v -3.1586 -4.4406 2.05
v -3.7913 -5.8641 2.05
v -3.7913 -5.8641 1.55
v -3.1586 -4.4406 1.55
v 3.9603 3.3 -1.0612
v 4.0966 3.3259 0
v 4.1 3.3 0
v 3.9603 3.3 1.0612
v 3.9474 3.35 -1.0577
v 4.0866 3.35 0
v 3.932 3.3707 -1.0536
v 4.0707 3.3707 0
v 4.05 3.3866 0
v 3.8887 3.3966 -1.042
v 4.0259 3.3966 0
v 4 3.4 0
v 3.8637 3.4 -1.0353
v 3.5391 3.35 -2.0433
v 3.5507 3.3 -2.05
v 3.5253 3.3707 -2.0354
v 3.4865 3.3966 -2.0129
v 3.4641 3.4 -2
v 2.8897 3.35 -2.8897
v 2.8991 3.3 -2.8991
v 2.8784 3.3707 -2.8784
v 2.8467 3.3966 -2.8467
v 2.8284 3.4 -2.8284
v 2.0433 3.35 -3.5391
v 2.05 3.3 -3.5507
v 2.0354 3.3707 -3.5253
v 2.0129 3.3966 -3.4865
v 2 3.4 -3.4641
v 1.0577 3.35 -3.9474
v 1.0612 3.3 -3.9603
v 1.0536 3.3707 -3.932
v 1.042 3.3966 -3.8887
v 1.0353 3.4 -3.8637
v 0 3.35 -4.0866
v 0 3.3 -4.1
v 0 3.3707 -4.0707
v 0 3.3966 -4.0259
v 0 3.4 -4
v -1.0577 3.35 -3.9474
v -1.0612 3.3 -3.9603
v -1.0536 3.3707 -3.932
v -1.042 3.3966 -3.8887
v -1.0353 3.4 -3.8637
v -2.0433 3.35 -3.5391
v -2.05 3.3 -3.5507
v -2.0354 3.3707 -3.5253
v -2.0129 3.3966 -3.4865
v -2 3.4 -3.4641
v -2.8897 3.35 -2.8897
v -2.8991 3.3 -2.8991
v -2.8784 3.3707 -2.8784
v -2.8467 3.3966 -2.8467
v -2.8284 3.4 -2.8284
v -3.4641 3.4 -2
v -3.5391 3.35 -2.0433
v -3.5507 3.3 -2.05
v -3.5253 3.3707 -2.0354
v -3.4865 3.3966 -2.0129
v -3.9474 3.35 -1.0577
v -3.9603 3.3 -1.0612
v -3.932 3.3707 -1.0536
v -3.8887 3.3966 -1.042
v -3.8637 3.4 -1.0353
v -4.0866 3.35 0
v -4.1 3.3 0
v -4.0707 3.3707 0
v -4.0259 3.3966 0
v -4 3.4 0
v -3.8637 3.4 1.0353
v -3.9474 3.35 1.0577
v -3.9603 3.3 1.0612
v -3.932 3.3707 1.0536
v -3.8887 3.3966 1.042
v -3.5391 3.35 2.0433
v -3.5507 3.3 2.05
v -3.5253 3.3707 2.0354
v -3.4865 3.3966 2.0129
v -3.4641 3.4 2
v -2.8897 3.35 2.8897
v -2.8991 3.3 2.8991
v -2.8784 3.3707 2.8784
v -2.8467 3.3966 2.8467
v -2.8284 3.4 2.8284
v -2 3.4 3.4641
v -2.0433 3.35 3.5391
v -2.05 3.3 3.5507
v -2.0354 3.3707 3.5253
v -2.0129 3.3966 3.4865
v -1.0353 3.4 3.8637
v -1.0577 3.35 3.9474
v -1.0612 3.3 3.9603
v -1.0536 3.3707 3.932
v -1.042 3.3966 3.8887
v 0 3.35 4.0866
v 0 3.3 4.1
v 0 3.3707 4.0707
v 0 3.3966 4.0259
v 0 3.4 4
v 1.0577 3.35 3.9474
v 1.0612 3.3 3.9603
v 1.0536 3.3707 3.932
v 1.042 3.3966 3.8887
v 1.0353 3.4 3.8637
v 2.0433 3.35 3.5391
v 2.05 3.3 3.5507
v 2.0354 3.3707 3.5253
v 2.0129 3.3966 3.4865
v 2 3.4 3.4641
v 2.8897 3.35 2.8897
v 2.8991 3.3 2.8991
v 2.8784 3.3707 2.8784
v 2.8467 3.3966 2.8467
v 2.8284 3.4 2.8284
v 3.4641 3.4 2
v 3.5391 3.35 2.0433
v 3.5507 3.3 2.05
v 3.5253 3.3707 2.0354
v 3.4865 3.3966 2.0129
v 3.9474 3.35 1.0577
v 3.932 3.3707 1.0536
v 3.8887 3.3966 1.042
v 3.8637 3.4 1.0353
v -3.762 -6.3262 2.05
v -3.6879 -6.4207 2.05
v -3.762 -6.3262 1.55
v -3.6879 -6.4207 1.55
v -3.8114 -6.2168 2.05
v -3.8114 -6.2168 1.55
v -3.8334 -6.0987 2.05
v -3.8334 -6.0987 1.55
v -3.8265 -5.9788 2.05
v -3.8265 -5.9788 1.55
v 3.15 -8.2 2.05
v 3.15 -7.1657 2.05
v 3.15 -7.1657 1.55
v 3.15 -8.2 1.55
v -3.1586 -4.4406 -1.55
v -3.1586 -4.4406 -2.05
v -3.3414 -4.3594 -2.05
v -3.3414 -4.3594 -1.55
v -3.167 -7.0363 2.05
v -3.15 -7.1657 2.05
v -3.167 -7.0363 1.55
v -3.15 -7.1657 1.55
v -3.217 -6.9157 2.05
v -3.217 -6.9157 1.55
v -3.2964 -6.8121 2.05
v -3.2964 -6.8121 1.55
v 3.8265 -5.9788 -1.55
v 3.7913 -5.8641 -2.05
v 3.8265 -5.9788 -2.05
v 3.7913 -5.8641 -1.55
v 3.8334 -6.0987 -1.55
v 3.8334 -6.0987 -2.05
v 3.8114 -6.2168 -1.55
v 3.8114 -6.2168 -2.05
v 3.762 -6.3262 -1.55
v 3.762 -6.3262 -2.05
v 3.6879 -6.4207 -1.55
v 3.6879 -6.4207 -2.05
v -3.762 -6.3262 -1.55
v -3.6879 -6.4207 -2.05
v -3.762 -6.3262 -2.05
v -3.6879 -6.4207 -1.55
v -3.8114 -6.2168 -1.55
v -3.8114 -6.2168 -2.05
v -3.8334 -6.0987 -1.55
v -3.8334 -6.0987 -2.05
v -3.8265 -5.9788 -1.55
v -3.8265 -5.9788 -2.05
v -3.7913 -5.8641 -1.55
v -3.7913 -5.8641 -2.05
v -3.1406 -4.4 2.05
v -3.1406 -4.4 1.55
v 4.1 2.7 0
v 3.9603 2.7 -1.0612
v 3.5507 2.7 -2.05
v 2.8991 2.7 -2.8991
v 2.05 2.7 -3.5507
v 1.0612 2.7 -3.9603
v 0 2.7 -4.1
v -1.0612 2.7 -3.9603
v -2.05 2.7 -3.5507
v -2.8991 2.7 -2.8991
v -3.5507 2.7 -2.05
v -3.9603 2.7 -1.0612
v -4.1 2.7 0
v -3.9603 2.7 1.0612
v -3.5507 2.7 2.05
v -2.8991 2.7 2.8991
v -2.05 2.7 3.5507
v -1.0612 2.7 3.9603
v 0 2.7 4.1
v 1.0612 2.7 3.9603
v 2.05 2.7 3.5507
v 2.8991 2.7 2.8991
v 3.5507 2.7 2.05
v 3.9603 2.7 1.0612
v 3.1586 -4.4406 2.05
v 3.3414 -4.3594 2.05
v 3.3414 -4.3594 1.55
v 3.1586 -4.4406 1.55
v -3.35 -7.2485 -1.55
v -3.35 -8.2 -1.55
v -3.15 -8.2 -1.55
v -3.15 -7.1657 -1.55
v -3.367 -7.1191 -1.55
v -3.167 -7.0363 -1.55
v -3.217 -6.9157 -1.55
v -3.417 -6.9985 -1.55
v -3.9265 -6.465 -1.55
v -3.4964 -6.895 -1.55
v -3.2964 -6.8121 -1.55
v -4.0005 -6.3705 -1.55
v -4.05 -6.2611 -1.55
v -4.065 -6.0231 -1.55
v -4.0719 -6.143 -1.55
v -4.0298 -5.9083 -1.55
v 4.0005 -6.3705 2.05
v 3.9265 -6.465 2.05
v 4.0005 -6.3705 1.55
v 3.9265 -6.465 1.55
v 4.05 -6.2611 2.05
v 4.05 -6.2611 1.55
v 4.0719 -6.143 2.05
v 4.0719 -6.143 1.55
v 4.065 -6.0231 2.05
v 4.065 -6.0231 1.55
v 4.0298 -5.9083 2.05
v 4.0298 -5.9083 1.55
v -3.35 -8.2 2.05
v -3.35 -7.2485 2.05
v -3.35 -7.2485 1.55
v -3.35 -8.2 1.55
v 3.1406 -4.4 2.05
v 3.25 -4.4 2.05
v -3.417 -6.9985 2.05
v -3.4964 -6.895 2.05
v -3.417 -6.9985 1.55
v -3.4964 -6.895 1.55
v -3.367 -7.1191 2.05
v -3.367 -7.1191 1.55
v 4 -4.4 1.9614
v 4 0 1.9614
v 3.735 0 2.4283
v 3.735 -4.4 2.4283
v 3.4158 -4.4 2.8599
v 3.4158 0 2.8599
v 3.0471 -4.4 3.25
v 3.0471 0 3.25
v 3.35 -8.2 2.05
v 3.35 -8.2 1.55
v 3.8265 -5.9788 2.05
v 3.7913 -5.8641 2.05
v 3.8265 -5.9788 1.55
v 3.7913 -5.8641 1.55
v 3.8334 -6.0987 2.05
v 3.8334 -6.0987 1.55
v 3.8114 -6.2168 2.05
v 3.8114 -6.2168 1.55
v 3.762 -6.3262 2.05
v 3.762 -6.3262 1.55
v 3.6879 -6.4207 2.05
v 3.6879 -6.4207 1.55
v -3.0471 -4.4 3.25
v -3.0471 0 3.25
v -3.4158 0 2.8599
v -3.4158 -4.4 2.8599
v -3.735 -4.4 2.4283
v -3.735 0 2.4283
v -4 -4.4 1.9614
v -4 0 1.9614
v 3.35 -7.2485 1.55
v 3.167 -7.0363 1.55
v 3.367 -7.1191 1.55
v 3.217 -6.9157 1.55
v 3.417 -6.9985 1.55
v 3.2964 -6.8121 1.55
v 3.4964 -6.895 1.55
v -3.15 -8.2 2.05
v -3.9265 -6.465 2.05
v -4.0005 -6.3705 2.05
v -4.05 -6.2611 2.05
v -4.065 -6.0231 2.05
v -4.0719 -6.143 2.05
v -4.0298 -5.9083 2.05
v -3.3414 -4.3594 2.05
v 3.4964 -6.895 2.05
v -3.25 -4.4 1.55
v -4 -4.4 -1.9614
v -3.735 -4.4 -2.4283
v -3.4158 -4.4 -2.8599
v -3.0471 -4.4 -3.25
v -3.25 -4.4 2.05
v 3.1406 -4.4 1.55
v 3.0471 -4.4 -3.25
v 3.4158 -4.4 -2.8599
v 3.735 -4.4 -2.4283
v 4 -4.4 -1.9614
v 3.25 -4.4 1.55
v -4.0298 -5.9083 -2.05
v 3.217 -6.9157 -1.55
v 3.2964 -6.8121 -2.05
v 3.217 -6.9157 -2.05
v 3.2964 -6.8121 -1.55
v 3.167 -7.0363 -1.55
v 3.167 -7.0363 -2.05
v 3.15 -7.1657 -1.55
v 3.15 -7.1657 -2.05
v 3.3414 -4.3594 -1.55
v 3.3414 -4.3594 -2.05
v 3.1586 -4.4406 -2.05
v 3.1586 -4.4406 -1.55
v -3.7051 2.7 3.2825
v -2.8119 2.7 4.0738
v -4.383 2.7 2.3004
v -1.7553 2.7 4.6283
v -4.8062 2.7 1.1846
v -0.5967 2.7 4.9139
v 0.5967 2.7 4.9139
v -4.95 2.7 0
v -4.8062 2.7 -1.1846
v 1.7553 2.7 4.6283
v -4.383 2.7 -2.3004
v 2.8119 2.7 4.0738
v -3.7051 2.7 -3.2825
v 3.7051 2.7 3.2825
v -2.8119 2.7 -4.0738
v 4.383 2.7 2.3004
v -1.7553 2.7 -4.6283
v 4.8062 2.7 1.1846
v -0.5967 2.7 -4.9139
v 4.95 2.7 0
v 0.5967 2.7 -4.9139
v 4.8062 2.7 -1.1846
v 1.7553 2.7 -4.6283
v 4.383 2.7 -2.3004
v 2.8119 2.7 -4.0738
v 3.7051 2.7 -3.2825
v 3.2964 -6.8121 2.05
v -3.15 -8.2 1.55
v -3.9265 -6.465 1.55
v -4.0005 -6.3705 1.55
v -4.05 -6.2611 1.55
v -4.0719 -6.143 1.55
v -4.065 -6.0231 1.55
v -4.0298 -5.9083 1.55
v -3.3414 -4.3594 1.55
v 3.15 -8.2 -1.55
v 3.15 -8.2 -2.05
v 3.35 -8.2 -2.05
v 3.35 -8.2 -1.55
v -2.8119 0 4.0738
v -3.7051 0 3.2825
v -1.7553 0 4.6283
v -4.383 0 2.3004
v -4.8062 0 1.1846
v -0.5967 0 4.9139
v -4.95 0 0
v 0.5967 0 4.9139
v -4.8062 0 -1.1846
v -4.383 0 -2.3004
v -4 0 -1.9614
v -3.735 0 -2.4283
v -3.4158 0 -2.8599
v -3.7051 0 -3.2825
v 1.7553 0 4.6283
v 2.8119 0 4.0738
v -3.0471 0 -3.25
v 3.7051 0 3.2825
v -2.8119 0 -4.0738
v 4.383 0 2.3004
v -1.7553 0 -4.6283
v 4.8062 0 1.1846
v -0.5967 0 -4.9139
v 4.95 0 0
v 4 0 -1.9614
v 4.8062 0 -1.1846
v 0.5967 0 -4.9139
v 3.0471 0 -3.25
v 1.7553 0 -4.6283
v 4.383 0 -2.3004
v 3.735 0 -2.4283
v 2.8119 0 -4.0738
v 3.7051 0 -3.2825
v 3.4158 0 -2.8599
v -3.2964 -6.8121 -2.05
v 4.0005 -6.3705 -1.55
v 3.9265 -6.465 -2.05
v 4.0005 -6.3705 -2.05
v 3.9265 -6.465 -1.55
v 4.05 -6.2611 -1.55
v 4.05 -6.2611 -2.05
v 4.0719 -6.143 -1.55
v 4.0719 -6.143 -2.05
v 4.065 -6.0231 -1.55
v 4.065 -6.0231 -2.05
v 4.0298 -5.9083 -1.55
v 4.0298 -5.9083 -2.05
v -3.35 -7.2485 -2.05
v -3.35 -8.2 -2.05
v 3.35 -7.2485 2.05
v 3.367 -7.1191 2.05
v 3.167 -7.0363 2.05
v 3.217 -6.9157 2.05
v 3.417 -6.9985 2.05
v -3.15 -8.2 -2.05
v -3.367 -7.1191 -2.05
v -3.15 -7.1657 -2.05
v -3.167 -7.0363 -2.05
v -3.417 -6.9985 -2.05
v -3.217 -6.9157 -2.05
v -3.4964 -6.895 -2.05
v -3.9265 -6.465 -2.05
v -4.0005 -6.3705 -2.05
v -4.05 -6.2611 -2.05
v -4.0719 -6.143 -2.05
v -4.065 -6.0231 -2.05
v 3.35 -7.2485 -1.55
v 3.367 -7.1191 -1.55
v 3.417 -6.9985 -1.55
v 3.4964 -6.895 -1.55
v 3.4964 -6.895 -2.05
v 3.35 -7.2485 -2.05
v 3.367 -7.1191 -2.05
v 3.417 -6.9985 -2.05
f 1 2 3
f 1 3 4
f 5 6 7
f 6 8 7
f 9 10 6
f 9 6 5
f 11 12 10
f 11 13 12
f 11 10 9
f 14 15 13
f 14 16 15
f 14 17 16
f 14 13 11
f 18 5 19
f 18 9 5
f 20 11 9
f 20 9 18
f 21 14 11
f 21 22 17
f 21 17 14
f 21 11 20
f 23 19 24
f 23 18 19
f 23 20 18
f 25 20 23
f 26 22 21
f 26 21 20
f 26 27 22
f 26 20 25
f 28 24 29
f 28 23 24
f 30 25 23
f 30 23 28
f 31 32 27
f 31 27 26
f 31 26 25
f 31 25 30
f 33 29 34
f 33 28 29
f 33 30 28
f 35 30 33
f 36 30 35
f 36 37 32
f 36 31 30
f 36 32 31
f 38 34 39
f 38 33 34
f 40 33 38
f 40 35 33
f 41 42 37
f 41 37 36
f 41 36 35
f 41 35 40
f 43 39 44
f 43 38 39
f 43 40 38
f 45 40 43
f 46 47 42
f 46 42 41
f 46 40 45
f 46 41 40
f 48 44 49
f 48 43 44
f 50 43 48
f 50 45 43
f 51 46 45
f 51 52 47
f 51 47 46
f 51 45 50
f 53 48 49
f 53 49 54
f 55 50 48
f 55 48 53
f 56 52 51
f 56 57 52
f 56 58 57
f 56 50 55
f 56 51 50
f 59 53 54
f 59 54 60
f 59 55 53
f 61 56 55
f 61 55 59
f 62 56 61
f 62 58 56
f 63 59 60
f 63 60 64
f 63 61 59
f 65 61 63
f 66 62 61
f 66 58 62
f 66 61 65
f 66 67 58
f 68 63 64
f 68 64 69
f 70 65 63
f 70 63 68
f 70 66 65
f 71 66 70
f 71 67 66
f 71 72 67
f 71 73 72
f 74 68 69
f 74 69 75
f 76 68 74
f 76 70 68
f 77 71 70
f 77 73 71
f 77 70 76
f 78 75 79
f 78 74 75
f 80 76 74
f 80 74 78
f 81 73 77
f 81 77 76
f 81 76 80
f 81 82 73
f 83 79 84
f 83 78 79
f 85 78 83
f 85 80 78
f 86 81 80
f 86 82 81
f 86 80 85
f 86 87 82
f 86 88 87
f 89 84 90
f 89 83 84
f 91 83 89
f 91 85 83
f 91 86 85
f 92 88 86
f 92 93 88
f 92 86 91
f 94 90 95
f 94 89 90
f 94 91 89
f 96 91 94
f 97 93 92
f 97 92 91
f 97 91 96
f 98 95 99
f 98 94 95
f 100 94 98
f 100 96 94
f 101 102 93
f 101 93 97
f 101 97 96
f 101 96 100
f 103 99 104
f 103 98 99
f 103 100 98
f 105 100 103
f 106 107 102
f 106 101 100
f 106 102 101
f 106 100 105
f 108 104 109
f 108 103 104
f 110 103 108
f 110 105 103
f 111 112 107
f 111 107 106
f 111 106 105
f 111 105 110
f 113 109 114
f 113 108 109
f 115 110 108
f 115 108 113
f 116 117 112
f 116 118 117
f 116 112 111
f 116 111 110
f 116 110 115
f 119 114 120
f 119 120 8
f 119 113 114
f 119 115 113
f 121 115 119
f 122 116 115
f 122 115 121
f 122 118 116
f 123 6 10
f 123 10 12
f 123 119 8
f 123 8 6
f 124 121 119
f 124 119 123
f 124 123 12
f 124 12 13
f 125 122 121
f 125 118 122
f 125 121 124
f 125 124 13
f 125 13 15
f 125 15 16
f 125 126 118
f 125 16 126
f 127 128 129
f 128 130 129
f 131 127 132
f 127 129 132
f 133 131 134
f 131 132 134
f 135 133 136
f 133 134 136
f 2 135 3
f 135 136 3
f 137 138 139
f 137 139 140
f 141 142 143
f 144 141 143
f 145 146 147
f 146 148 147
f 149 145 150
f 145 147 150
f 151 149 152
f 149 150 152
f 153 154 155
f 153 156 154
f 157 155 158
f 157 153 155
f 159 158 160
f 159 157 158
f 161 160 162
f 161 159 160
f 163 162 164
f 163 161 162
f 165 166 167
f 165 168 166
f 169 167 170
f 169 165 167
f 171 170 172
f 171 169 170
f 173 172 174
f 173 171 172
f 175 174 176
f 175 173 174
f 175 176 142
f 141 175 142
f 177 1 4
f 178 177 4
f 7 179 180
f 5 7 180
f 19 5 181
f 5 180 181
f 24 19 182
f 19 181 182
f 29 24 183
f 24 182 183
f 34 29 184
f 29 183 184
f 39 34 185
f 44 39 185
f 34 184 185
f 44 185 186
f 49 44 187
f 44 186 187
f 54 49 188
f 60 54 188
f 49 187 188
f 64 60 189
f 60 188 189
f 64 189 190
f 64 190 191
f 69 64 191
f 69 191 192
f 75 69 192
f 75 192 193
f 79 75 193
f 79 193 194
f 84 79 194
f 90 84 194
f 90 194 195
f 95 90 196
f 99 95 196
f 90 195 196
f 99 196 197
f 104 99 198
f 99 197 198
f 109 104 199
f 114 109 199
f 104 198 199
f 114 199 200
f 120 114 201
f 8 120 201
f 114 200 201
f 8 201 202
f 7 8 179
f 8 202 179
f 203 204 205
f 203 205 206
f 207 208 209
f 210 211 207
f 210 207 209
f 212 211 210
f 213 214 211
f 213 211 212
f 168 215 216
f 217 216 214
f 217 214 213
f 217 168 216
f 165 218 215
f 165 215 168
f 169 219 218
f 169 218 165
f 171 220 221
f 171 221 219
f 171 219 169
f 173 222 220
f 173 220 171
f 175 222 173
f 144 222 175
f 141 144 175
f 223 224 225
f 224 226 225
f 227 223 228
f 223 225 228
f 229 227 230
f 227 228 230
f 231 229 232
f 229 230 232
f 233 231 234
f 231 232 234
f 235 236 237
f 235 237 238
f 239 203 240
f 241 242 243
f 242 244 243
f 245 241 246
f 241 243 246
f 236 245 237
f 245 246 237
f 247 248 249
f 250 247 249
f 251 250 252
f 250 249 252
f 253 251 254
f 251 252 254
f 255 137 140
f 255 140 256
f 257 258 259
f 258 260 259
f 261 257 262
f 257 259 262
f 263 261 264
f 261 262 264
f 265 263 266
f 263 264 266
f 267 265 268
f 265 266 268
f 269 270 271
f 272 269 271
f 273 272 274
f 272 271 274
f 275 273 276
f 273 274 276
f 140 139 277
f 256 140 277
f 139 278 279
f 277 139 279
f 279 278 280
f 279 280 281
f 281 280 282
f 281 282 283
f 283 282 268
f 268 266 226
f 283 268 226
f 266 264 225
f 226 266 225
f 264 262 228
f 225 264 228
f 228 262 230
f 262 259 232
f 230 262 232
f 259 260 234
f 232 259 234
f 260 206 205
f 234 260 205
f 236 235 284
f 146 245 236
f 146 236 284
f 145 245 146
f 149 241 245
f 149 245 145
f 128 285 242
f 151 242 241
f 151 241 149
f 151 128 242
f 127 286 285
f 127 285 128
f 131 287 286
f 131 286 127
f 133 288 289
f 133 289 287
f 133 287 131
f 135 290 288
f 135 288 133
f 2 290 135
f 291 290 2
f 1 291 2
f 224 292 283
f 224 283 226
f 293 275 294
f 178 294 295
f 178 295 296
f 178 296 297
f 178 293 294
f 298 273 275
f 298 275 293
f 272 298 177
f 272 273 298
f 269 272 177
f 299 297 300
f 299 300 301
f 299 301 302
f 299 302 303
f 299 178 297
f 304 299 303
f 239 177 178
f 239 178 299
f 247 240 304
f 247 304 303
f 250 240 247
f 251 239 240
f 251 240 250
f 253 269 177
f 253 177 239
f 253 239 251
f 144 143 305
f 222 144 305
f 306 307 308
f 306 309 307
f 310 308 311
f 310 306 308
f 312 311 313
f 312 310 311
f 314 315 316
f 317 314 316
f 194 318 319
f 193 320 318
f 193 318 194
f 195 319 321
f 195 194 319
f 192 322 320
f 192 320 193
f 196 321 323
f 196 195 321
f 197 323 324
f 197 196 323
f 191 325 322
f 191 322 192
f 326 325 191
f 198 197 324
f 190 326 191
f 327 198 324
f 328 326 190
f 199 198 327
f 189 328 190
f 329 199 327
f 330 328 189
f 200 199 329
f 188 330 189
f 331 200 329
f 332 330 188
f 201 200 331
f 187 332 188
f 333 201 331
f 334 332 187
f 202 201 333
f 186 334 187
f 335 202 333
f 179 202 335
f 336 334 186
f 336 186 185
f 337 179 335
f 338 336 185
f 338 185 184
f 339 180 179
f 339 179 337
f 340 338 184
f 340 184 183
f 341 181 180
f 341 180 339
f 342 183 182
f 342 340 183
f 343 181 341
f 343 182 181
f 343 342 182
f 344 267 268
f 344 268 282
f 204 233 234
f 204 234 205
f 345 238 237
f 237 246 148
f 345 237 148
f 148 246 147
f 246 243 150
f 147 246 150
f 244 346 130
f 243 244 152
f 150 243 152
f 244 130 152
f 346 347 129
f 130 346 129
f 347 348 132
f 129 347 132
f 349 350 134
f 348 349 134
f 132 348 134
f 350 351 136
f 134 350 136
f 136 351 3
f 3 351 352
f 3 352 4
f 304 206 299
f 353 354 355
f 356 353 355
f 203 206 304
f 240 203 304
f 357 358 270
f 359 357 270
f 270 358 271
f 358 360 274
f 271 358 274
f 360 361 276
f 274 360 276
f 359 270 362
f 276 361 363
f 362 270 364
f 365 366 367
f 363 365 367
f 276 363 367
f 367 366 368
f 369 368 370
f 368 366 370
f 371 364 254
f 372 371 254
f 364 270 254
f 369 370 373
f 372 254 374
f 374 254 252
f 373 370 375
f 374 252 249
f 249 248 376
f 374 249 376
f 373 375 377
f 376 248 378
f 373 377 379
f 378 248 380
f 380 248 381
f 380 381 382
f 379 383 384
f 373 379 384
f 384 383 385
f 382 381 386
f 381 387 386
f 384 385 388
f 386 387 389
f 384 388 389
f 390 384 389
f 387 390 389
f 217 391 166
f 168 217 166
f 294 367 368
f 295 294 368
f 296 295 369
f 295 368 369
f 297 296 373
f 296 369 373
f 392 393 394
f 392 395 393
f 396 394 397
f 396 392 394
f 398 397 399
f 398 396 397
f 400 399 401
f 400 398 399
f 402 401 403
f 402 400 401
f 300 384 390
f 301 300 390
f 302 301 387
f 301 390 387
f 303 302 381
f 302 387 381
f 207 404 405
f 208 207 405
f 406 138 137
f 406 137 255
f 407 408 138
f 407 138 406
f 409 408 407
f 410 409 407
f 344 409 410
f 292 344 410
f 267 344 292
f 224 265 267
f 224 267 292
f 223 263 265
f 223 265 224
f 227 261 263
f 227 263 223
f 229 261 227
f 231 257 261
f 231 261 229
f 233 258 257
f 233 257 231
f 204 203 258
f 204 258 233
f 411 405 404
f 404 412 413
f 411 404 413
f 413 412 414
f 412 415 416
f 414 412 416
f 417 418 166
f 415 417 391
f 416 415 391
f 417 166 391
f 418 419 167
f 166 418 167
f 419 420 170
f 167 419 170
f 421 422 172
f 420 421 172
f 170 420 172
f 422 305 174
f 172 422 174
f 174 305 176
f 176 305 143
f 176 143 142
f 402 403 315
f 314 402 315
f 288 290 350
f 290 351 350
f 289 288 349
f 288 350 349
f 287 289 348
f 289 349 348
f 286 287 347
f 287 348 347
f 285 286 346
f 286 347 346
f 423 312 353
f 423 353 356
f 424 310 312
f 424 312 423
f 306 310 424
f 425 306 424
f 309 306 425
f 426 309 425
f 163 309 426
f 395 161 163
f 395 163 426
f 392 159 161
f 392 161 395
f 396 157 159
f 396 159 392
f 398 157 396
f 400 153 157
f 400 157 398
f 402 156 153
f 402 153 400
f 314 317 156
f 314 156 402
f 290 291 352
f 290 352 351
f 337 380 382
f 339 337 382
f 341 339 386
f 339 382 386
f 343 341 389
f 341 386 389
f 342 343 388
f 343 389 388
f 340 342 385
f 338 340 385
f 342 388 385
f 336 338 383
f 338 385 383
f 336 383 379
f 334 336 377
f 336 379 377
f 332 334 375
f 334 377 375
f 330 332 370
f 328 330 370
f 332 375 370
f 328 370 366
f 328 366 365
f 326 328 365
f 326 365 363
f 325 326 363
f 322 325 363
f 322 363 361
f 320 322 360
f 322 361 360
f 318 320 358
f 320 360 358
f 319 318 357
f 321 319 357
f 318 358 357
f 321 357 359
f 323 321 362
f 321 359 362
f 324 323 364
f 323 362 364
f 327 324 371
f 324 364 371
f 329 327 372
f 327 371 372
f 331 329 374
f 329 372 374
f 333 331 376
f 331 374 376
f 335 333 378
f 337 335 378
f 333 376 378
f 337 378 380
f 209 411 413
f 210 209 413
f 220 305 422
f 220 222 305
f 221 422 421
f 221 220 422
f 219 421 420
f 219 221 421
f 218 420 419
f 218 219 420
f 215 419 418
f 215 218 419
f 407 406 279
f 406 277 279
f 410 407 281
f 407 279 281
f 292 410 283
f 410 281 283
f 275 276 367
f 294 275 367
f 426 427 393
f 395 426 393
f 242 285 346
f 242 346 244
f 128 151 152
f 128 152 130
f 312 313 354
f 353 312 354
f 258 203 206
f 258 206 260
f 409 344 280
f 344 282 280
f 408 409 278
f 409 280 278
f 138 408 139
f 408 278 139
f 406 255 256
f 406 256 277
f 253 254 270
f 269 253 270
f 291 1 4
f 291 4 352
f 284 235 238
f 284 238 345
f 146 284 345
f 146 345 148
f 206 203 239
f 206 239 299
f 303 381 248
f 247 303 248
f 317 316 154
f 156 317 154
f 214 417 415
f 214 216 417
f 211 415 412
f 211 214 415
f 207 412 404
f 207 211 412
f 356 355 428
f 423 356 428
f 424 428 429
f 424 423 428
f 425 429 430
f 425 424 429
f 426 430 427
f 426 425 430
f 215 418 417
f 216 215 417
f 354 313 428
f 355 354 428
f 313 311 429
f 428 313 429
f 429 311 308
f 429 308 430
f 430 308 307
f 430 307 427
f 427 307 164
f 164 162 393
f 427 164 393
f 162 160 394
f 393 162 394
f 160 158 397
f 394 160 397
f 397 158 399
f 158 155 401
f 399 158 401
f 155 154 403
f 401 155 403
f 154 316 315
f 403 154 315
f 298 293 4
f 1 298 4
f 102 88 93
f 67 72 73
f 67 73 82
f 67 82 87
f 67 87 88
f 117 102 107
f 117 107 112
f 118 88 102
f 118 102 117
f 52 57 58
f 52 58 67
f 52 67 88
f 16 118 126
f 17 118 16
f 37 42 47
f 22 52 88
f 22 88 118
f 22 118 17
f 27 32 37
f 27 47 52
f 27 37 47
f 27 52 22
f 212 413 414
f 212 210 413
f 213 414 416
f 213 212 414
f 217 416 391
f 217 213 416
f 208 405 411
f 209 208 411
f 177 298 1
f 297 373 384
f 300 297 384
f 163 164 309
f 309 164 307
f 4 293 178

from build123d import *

# Parameters (mm, degrees)
SKETCH1_R             = 4.95
BOSS_EXTRUDE1_DEPTH   = 2.7
SKETCH2_R             = 4.1
BOSS_EXTRUDE2_DEPTH   = 0.7
BOSS_EXTRUDE3_DEPTH   = 4.4
EXTRUDE_THIN1_START   = -1.2
EXTRUDE_THIN1_DEPTH   = 0.5
EXTRUDE_THIN1_2_DEPTH = 0.5
FILLET1_R             = 0.5
FILLET2_R             = 0.5
BOSS_EXTRUDE4_REACH   = 12.458
SKETCH5_W             = 0.2
SKETCH5_H             = 0.5
BOSS_EXTRUDE5_REACH   = 12.458
SKETCH6_W             = 0.2
SKETCH6_H             = 0.5
FILLET3_R             = 0.1


with BuildPart() as part:
    # Sketch1 → Boss-Extrude1 (new body)
    with BuildSketch(Plane(origin=(0, 0, 0), x_dir=(1, 0, 0), z_dir=(0, 1, 0))):
        Circle(SKETCH1_R)
    extrude(amount=BOSS_EXTRUDE1_DEPTH)

    # Sketch2 → Boss-Extrude2 (add)
    with BuildSketch(Plane(origin=(0, 2.7, 0), x_dir=(1, 0, 0), z_dir=(0, 1, 0))):
        Circle(SKETCH2_R)
    extrude(amount=BOSS_EXTRUDE2_DEPTH)

    # Sketch3 → Boss-Extrude3 (add)
    with BuildSketch(Plane.XZ):
        with BuildLine():
            Line((3.047051854, 3.25), (-3.047051854, 3.25))
            ThreePointArc((-3.047051854, 3.25), (-3.581950323, 2.648897296), (-4, 1.96138344))
            Line((-4, 1.96138344), (-4, -1.96138344))
            ThreePointArc((-4, -1.96138344), (-3.581950323, -2.648897296), (-3.047051854, -3.25))
            Line((-3.047051854, -3.25), (3.047051854, -3.25))
            ThreePointArc((3.047051854, -3.25), (3.581950323, -2.648897296), (4, -1.96138344))
            Line((4, -1.96138344), (4, 1.96138344))
            ThreePointArc((4, 1.96138344), (3.581950323, 2.648897296), (3.047051854, 3.25))
        make_face()
    extrude(amount=BOSS_EXTRUDE3_DEPTH)

    # Boss-Extrude4: up to this face of the body (flat: up to its plane)
    boss_extrude4_end = Plane(part.part.faces().sort_by_distance((0, -4.4, 0))[0])
    # Sketch5 → Boss-Extrude4 (add, up to the picked face)
    with BuildSketch(Plane(origin=(2.169072165, -4.880412371, 0), x_dir=(0.913811549, 0.406138466, 0), z_dir=(-0.406138466, 0.913811549, 0)), mode=Mode.PRIVATE) as boss_extrude4_sk1:
        with Locations((1.182878282, -1.8)):
            Rectangle(SKETCH5_W, SKETCH5_H)
    boss_extrude4_tool1 = split(extrude(boss_extrude4_sk1.sketch, amount=BOSS_EXTRUDE4_REACH, mode=Mode.PRIVATE), bisect_by=boss_extrude4_end, keep=Keep.BOTH, mode=Mode.PRIVATE)
    add(boss_extrude4_tool1.solids().sort_by_distance((3.25, -4.4, 1.8))[0])

    # Boss-Extrude5: up to this face of the body (flat: up to its plane)
    boss_extrude5_end = Plane(part.part.faces().sort_by_distance((-0.003510671, -4.4, -0.001977667))[0])
    # Sketch6 → Boss-Extrude5 (add, up to the picked face)
    with BuildSketch(Plane(origin=(-2.169072165, -4.880412371, 0), x_dir=(0.913811549, -0.406138466, 0), z_dir=(0.406138466, 0.913811549, 0)), mode=Mode.PRIVATE) as boss_extrude5_sk1:
        with Locations((-1.182878282, -1.8)):
            Rectangle(SKETCH6_W, SKETCH6_H)
    boss_extrude5_tool1 = split(extrude(boss_extrude5_sk1.sketch, amount=BOSS_EXTRUDE5_REACH, mode=Mode.PRIVATE), bisect_by=boss_extrude5_end, keep=Keep.BOTH, mode=Mode.PRIVATE)
    add(boss_extrude5_tool1.solids().sort_by_distance((-3.25, -4.4, 1.8))[0])

    # Fillet3
    fillet3_edges = [part.edges().sort_by_distance(p)[0] for p in [
        (-4.1, 3.4, 0),
    ]]
    fillet(fillet3_edges, radius=FILLET3_R)


with BuildPart() as body_2:
    # Sketch4 → Extrude-Thin1 (new body)
    with BuildSketch(Plane.XY.offset(3.25).offset(EXTRUDE_THIN1_START)):
        Polygon((-3.341381155, -4.359386153), (-4.169274708, -6.222146648), (-3.35, -7.041421356), (-3.35, -8.2), (-3.15, -8.2), (-3.15, -6.958578644), (-3.930725292, -6.177853352), (-3.158618845, -4.440613847), align=None)
    extrude(amount=-EXTRUDE_THIN1_DEPTH)

    # Fillet1
    fillet1_edges = [body_2.edges().sort_by_distance(p)[0] for p in [
        (-3.35, -7.041421356, 1.8),
        (-4.169274708, -6.222146648, 1.8),
        (-3.930725292, -6.177853352, 1.8),
        (-3.15, -6.958578644, 1.8),
    ]]
    fillet(fillet1_edges, radius=FILLET1_R)


with BuildPart() as body_3:
    # Sketch4 → Extrude-Thin1 2 (new body)
    with BuildSketch(Plane.XY.offset(3.25).offset(EXTRUDE_THIN1_START)):
        Polygon((3.158618845, -4.440613847), (3.930725292, -6.177853352), (3.15, -6.958578644), (3.15, -8.2), (3.35, -8.2), (3.35, -7.041421356), (4.169274708, -6.222146648), (3.341381155, -4.359386153), align=None)
    extrude(amount=-EXTRUDE_THIN1_2_DEPTH)

    # Fillet2
    fillet2_edges = [body_3.edges().sort_by_distance(p)[0] for p in [
        (3.15, -6.958578644, 1.8),
        (3.930725292, -6.177853352, 1.8),
        (4.169274708, -6.222146648, 1.8),
        (3.35, -7.041421356, 1.8),
    ]]
    fillet(fillet2_edges, radius=FILLET2_R)


with BuildPart() as body_4:
    # Mirror2: mirrored copy
    add(body_2.part.mirror(Plane.XY))


with BuildPart() as body_5:
    # Mirror2 2: mirrored copy
    add(body_3.part.mirror(Plane.XY))


solid = Compound([part.part, body_2.part, body_3.part, body_4.part, body_5.part])
